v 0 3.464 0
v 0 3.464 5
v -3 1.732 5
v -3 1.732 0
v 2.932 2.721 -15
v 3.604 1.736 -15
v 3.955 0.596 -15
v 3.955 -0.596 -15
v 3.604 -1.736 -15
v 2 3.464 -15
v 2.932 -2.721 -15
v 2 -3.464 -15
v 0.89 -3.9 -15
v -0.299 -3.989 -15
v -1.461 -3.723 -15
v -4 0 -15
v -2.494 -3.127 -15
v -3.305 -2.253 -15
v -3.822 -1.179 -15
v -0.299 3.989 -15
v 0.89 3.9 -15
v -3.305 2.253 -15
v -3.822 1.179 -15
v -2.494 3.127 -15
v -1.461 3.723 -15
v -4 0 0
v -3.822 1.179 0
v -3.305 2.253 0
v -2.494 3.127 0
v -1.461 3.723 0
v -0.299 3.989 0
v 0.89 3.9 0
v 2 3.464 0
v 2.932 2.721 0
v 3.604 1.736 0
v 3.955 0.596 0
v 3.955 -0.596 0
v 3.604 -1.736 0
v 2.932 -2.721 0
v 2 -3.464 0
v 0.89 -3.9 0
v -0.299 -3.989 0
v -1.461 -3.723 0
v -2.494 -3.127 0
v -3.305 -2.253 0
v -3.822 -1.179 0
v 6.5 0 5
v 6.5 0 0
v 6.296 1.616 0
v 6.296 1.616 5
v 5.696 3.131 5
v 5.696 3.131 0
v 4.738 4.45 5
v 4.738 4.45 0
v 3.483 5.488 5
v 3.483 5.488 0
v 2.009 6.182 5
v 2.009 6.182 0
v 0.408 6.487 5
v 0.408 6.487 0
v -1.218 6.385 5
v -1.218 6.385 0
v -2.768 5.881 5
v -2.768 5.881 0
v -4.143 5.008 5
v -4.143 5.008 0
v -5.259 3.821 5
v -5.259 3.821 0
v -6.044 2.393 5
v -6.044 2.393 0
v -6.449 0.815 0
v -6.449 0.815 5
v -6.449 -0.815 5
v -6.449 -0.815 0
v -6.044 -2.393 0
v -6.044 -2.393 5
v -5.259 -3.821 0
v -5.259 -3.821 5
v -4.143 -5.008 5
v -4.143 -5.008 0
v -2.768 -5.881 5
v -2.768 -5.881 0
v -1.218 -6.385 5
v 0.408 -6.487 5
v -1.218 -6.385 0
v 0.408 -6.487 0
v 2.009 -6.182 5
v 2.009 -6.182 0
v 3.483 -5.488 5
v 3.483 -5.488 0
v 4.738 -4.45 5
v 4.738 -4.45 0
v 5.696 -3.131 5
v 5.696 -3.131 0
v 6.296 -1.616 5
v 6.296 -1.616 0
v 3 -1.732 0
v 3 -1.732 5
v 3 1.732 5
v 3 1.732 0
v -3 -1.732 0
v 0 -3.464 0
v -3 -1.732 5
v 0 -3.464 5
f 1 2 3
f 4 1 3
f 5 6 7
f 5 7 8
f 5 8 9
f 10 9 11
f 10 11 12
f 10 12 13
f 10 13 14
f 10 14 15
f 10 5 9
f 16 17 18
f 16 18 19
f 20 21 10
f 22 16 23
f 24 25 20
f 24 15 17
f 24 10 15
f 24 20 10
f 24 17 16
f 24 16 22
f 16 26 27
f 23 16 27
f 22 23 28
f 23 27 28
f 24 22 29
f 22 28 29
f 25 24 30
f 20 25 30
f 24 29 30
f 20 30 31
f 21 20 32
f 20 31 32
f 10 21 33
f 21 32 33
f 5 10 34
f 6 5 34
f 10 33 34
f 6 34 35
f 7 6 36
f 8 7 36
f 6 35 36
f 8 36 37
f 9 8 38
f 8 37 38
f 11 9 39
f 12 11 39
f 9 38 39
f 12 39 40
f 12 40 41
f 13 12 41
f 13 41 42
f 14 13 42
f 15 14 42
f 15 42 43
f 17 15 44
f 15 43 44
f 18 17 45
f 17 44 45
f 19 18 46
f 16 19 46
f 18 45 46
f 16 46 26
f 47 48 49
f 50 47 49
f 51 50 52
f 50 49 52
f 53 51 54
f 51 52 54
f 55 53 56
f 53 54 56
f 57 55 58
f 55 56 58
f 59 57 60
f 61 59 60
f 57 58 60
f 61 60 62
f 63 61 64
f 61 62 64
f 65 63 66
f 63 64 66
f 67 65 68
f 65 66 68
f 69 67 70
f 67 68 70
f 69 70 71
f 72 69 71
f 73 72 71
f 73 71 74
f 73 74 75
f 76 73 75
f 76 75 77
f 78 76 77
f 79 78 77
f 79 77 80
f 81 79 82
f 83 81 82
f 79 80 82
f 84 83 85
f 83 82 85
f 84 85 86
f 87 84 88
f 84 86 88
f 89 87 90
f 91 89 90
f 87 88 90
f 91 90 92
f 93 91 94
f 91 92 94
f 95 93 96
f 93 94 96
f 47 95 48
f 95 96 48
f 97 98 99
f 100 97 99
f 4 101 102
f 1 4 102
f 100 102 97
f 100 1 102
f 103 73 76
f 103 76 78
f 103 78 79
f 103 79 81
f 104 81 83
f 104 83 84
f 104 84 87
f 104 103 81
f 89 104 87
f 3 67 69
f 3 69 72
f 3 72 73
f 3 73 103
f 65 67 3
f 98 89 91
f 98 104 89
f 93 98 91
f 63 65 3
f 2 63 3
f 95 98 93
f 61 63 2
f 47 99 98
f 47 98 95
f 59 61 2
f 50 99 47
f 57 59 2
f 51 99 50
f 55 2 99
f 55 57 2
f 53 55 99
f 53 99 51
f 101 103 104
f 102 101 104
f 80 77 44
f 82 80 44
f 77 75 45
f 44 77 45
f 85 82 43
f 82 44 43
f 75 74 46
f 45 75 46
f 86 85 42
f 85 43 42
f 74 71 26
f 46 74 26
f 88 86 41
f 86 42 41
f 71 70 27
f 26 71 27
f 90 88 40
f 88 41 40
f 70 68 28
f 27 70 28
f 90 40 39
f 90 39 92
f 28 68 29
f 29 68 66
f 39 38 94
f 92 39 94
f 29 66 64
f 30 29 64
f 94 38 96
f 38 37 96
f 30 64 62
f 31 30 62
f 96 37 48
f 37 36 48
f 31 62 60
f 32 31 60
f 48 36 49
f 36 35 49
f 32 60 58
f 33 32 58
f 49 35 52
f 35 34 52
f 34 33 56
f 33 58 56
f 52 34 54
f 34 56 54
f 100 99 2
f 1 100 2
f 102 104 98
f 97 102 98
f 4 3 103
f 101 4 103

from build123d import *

# Parameters (mm, degrees)
SKETCH1_R           = 6.5
BASE_EXTRUDE_DEPTH  = 5
SKETCH2_R           = 4
BOSS_EXTRUDE1_DEPTH = 15
CUT_EXTRUDE1_DEPTH  = 5


with BuildPart() as part:
    # Sketch1 → Base-Extrude (new body)
    with BuildSketch(Plane.XY):
        Circle(SKETCH1_R)
    extrude(amount=BASE_EXTRUDE_DEPTH)

    # Sketch2 → Boss-Extrude1 (add)
    with BuildSketch(Plane(origin=(0, 0, 0), x_dir=(-1, 0, 0), z_dir=(0, 0, -1))):
        Circle(SKETCH2_R)
    extrude(amount=BOSS_EXTRUDE1_DEPTH)

    # Sketch3 → Cut-Extrude1 (cut)
    with BuildSketch(Plane.XY.offset(5)):
        Polygon((0, 3.464101615), (-3, 1.732050808), (-3, -1.732050808), (0, -3.464101615), (3, -1.732050808), (3, 1.732050808), align=None)
    extrude(amount=-CUT_EXTRUDE1_DEPTH, mode=Mode.SUBTRACT)


solid = part.part
